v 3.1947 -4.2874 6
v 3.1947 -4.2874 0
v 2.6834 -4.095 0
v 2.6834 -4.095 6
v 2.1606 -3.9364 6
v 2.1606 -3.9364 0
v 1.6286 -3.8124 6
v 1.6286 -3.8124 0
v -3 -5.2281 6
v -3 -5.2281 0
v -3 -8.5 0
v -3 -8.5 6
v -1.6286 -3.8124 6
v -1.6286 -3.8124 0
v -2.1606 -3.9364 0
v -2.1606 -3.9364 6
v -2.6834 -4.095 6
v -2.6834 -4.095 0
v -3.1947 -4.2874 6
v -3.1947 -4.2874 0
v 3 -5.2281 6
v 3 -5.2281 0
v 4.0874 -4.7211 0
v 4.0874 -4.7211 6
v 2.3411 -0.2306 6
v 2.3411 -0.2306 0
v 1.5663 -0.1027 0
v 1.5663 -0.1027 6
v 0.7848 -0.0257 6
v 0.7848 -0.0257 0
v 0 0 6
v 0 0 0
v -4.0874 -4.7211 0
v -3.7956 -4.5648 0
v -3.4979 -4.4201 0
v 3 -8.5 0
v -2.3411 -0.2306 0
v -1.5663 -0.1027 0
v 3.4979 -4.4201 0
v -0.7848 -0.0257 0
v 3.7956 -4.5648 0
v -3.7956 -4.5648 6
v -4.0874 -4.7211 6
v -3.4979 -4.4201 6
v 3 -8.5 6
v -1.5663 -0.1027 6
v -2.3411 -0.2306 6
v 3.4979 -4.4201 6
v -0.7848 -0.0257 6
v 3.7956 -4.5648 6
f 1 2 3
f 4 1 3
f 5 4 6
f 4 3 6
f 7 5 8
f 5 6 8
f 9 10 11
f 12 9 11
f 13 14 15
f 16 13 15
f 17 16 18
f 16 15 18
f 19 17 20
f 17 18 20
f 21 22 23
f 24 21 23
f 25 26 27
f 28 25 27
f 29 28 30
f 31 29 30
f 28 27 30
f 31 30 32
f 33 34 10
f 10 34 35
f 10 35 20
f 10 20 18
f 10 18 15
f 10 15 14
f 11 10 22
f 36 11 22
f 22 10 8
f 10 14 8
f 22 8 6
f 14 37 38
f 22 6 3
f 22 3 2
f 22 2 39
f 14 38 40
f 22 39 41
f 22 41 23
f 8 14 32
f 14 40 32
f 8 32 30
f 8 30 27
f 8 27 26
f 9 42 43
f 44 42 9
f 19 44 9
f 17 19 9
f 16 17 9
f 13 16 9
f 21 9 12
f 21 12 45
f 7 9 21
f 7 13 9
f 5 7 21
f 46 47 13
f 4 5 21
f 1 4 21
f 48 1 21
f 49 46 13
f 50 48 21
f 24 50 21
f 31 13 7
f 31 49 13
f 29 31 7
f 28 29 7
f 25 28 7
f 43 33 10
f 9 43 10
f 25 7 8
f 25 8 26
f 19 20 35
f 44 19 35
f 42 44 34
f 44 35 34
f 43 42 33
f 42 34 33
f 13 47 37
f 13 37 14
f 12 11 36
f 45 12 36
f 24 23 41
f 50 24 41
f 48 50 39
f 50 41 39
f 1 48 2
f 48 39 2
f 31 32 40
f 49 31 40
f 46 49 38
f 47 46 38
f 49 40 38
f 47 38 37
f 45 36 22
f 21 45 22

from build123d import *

# Parameters (mm, degrees)
RESSALTO_EXTRUS_O1_DEPTH = 6


with BuildPart() as part:
    # Esboço1 → Ressalto-extrusão1 (new body)
    with BuildSketch(Plane.XY):
        with BuildLine():
            Line((-3, -5.228144515), (-3, -8.5))
            Line((-3, -8.5), (3, -8.5))
            Line((3, -8.5), (3, -5.228144515))
            Line((3, -5.228144515), (4.087420479, -4.721072019))
            ThreePointArc((4.087420479, -4.721072019), (3.647489335, -4.490964091), (3.194657217, -4.28741522))
            ThreePointArc((3.194657217, -4.28741522), (2.423308565, -4.011422259), (1.628622126, -3.812363669))
            ThreePointArc((1.628622126, -3.812363669), (0, -3.65195839), (-1.628622126, -3.812363669))
            ThreePointArc((-1.628622126, -3.812363669), (-2.423308565, -4.011422259), (-3.194657217, -4.28741522))
            ThreePointArc((-3.194657217, -4.28741522), (-3.647489335, -4.490964091), (-4.087420479, -4.721072019))
            Line((-4.087420479, -4.721072019), (-3, -5.228144515))
        make_face()
        with BuildLine():
            Line((-2.341083864, -0.230576635), (-1.628622126, -3.812363669))
            ThreePointArc((-1.628622126, -3.812363669), (0, -3.65195839), (1.628622126, -3.812363669))
            Line((1.628622126, -3.812363669), (2.341083864, -0.230576635))
            ThreePointArc((2.341083864, -0.230576635), (1.176205684, -0.05778328), (0, 0))
            ThreePointArc((0, 0), (-1.176205684, -0.05778328), (-2.341083864, -0.230576635))
        make_face()
    extrude(amount=RESSALTO_EXTRUS_O1_DEPTH)


solid = part.part
